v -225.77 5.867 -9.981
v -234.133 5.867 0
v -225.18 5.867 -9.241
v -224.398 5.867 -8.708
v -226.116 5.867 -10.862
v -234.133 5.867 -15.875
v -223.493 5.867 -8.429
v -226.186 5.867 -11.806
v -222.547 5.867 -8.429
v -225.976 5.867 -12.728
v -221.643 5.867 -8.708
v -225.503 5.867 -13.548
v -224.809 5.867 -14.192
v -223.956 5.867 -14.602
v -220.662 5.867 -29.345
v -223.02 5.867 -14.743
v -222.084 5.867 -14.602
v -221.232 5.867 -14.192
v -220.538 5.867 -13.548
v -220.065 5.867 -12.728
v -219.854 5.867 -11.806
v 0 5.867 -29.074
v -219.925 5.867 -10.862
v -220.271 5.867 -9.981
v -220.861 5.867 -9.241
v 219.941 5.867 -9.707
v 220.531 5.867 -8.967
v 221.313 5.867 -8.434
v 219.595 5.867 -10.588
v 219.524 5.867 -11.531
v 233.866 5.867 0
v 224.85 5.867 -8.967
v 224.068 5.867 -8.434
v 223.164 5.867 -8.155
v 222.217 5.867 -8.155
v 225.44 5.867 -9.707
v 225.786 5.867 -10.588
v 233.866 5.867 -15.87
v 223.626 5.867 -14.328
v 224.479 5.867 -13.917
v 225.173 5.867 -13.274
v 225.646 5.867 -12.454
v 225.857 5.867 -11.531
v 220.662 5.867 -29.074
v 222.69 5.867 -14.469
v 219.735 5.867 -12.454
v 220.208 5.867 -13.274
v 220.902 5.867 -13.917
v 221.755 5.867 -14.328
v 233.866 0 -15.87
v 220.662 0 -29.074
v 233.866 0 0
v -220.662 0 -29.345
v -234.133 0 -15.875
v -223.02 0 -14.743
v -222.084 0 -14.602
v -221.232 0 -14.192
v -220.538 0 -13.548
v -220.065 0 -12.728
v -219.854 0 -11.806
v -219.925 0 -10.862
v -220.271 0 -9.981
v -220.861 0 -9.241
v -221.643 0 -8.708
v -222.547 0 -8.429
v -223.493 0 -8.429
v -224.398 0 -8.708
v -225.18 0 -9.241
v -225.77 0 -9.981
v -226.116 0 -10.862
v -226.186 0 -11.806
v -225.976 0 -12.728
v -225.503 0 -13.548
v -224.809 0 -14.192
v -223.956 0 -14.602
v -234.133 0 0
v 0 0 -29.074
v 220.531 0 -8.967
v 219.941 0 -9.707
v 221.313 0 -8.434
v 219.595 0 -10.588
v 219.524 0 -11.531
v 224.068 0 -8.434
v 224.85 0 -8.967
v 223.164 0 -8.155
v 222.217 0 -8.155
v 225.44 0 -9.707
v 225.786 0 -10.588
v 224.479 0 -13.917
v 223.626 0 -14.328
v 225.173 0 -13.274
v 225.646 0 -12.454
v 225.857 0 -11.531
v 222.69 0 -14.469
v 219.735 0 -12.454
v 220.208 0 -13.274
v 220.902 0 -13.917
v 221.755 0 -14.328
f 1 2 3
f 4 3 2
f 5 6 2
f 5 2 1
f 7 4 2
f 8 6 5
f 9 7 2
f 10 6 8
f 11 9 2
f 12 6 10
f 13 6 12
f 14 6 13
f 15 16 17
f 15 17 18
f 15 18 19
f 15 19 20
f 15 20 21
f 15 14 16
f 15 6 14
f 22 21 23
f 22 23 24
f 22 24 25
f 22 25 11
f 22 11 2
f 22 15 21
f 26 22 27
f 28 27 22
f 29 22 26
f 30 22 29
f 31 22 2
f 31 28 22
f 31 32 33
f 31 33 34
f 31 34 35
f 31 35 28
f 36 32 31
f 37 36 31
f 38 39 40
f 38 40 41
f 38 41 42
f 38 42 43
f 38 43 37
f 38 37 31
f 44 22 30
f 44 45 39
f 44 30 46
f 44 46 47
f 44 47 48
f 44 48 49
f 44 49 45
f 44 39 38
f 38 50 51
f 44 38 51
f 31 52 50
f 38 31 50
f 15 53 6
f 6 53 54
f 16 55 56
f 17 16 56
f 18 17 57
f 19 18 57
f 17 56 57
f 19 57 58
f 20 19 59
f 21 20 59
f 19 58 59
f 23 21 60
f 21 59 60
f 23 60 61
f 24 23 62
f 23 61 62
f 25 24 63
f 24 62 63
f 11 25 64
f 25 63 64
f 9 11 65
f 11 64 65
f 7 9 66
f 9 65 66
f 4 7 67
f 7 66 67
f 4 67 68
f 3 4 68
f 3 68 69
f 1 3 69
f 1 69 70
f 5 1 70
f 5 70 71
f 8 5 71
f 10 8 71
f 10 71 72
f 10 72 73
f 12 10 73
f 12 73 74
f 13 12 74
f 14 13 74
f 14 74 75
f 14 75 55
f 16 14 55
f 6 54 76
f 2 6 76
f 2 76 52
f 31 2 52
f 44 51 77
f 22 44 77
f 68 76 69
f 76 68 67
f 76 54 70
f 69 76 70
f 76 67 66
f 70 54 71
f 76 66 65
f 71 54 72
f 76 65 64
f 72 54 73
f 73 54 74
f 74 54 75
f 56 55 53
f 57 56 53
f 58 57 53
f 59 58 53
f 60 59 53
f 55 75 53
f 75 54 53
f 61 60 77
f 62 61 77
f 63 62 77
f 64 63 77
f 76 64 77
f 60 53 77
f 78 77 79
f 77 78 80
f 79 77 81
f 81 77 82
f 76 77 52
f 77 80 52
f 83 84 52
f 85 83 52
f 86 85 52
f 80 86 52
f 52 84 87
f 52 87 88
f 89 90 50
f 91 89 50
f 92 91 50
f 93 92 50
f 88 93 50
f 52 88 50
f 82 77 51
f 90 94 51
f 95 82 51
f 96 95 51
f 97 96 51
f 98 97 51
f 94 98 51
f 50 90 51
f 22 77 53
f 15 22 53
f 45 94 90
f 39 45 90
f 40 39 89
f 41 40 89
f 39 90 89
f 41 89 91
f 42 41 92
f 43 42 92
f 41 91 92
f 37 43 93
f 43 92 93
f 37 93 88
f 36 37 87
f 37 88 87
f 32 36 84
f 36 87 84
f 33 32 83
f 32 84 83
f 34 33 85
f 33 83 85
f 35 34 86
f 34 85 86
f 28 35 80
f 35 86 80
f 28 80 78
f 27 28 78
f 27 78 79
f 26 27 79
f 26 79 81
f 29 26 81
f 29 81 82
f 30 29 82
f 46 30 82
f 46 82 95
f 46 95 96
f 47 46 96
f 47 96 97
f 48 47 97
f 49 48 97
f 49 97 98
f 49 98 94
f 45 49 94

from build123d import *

# Parameters (mm, degrees)
BOSS_EXTRUDE1_DEPTH = 5.8674
SKETCH2_R           = 3.175
CUT_EXTRUDE2_DEPTH  = 10.16
SKETCH4_R           = 3.175
CUT_EXTRUDE3_DEPTH  = 10.16


with BuildPart() as part:
    # Sketch1 → Boss-Extrude1 (new body)
    with BuildSketch(Plane(origin=(0, 0, 0), x_dir=(1, 0, 0), z_dir=(0, 1, 0))):
        Polygon((0, 0), (233.866472168, 0), (233.866472168, 15.870150114), (220.6625, 29.074122282), (0, 29.074122282), (-220.662333268, 29.345384182), (-234.132717449, 15.875), (-234.132717449, 0), align=None)
    extrude(amount=BOSS_EXTRUDE1_DEPTH)

    # Sketch2 → Cut-Extrude2 (cut)
    with BuildSketch(Plane.XZ):
        with Locations(Location((-223.020217449, -11.568269312, 0), (0, 0, 270))):
            Circle(SKETCH2_R)
    extrude(amount=-CUT_EXTRUDE2_DEPTH, mode=Mode.SUBTRACT)

    # Sketch4 → Cut-Extrude3 (cut)
    with BuildSketch(Plane.XZ):
        with Locations(Location((222.690472168, -11.294122282, 0), (0, 0, 270))):
            Circle(SKETCH4_R)
    extrude(amount=-CUT_EXTRUDE3_DEPTH, mode=Mode.SUBTRACT)


solid = part.part
